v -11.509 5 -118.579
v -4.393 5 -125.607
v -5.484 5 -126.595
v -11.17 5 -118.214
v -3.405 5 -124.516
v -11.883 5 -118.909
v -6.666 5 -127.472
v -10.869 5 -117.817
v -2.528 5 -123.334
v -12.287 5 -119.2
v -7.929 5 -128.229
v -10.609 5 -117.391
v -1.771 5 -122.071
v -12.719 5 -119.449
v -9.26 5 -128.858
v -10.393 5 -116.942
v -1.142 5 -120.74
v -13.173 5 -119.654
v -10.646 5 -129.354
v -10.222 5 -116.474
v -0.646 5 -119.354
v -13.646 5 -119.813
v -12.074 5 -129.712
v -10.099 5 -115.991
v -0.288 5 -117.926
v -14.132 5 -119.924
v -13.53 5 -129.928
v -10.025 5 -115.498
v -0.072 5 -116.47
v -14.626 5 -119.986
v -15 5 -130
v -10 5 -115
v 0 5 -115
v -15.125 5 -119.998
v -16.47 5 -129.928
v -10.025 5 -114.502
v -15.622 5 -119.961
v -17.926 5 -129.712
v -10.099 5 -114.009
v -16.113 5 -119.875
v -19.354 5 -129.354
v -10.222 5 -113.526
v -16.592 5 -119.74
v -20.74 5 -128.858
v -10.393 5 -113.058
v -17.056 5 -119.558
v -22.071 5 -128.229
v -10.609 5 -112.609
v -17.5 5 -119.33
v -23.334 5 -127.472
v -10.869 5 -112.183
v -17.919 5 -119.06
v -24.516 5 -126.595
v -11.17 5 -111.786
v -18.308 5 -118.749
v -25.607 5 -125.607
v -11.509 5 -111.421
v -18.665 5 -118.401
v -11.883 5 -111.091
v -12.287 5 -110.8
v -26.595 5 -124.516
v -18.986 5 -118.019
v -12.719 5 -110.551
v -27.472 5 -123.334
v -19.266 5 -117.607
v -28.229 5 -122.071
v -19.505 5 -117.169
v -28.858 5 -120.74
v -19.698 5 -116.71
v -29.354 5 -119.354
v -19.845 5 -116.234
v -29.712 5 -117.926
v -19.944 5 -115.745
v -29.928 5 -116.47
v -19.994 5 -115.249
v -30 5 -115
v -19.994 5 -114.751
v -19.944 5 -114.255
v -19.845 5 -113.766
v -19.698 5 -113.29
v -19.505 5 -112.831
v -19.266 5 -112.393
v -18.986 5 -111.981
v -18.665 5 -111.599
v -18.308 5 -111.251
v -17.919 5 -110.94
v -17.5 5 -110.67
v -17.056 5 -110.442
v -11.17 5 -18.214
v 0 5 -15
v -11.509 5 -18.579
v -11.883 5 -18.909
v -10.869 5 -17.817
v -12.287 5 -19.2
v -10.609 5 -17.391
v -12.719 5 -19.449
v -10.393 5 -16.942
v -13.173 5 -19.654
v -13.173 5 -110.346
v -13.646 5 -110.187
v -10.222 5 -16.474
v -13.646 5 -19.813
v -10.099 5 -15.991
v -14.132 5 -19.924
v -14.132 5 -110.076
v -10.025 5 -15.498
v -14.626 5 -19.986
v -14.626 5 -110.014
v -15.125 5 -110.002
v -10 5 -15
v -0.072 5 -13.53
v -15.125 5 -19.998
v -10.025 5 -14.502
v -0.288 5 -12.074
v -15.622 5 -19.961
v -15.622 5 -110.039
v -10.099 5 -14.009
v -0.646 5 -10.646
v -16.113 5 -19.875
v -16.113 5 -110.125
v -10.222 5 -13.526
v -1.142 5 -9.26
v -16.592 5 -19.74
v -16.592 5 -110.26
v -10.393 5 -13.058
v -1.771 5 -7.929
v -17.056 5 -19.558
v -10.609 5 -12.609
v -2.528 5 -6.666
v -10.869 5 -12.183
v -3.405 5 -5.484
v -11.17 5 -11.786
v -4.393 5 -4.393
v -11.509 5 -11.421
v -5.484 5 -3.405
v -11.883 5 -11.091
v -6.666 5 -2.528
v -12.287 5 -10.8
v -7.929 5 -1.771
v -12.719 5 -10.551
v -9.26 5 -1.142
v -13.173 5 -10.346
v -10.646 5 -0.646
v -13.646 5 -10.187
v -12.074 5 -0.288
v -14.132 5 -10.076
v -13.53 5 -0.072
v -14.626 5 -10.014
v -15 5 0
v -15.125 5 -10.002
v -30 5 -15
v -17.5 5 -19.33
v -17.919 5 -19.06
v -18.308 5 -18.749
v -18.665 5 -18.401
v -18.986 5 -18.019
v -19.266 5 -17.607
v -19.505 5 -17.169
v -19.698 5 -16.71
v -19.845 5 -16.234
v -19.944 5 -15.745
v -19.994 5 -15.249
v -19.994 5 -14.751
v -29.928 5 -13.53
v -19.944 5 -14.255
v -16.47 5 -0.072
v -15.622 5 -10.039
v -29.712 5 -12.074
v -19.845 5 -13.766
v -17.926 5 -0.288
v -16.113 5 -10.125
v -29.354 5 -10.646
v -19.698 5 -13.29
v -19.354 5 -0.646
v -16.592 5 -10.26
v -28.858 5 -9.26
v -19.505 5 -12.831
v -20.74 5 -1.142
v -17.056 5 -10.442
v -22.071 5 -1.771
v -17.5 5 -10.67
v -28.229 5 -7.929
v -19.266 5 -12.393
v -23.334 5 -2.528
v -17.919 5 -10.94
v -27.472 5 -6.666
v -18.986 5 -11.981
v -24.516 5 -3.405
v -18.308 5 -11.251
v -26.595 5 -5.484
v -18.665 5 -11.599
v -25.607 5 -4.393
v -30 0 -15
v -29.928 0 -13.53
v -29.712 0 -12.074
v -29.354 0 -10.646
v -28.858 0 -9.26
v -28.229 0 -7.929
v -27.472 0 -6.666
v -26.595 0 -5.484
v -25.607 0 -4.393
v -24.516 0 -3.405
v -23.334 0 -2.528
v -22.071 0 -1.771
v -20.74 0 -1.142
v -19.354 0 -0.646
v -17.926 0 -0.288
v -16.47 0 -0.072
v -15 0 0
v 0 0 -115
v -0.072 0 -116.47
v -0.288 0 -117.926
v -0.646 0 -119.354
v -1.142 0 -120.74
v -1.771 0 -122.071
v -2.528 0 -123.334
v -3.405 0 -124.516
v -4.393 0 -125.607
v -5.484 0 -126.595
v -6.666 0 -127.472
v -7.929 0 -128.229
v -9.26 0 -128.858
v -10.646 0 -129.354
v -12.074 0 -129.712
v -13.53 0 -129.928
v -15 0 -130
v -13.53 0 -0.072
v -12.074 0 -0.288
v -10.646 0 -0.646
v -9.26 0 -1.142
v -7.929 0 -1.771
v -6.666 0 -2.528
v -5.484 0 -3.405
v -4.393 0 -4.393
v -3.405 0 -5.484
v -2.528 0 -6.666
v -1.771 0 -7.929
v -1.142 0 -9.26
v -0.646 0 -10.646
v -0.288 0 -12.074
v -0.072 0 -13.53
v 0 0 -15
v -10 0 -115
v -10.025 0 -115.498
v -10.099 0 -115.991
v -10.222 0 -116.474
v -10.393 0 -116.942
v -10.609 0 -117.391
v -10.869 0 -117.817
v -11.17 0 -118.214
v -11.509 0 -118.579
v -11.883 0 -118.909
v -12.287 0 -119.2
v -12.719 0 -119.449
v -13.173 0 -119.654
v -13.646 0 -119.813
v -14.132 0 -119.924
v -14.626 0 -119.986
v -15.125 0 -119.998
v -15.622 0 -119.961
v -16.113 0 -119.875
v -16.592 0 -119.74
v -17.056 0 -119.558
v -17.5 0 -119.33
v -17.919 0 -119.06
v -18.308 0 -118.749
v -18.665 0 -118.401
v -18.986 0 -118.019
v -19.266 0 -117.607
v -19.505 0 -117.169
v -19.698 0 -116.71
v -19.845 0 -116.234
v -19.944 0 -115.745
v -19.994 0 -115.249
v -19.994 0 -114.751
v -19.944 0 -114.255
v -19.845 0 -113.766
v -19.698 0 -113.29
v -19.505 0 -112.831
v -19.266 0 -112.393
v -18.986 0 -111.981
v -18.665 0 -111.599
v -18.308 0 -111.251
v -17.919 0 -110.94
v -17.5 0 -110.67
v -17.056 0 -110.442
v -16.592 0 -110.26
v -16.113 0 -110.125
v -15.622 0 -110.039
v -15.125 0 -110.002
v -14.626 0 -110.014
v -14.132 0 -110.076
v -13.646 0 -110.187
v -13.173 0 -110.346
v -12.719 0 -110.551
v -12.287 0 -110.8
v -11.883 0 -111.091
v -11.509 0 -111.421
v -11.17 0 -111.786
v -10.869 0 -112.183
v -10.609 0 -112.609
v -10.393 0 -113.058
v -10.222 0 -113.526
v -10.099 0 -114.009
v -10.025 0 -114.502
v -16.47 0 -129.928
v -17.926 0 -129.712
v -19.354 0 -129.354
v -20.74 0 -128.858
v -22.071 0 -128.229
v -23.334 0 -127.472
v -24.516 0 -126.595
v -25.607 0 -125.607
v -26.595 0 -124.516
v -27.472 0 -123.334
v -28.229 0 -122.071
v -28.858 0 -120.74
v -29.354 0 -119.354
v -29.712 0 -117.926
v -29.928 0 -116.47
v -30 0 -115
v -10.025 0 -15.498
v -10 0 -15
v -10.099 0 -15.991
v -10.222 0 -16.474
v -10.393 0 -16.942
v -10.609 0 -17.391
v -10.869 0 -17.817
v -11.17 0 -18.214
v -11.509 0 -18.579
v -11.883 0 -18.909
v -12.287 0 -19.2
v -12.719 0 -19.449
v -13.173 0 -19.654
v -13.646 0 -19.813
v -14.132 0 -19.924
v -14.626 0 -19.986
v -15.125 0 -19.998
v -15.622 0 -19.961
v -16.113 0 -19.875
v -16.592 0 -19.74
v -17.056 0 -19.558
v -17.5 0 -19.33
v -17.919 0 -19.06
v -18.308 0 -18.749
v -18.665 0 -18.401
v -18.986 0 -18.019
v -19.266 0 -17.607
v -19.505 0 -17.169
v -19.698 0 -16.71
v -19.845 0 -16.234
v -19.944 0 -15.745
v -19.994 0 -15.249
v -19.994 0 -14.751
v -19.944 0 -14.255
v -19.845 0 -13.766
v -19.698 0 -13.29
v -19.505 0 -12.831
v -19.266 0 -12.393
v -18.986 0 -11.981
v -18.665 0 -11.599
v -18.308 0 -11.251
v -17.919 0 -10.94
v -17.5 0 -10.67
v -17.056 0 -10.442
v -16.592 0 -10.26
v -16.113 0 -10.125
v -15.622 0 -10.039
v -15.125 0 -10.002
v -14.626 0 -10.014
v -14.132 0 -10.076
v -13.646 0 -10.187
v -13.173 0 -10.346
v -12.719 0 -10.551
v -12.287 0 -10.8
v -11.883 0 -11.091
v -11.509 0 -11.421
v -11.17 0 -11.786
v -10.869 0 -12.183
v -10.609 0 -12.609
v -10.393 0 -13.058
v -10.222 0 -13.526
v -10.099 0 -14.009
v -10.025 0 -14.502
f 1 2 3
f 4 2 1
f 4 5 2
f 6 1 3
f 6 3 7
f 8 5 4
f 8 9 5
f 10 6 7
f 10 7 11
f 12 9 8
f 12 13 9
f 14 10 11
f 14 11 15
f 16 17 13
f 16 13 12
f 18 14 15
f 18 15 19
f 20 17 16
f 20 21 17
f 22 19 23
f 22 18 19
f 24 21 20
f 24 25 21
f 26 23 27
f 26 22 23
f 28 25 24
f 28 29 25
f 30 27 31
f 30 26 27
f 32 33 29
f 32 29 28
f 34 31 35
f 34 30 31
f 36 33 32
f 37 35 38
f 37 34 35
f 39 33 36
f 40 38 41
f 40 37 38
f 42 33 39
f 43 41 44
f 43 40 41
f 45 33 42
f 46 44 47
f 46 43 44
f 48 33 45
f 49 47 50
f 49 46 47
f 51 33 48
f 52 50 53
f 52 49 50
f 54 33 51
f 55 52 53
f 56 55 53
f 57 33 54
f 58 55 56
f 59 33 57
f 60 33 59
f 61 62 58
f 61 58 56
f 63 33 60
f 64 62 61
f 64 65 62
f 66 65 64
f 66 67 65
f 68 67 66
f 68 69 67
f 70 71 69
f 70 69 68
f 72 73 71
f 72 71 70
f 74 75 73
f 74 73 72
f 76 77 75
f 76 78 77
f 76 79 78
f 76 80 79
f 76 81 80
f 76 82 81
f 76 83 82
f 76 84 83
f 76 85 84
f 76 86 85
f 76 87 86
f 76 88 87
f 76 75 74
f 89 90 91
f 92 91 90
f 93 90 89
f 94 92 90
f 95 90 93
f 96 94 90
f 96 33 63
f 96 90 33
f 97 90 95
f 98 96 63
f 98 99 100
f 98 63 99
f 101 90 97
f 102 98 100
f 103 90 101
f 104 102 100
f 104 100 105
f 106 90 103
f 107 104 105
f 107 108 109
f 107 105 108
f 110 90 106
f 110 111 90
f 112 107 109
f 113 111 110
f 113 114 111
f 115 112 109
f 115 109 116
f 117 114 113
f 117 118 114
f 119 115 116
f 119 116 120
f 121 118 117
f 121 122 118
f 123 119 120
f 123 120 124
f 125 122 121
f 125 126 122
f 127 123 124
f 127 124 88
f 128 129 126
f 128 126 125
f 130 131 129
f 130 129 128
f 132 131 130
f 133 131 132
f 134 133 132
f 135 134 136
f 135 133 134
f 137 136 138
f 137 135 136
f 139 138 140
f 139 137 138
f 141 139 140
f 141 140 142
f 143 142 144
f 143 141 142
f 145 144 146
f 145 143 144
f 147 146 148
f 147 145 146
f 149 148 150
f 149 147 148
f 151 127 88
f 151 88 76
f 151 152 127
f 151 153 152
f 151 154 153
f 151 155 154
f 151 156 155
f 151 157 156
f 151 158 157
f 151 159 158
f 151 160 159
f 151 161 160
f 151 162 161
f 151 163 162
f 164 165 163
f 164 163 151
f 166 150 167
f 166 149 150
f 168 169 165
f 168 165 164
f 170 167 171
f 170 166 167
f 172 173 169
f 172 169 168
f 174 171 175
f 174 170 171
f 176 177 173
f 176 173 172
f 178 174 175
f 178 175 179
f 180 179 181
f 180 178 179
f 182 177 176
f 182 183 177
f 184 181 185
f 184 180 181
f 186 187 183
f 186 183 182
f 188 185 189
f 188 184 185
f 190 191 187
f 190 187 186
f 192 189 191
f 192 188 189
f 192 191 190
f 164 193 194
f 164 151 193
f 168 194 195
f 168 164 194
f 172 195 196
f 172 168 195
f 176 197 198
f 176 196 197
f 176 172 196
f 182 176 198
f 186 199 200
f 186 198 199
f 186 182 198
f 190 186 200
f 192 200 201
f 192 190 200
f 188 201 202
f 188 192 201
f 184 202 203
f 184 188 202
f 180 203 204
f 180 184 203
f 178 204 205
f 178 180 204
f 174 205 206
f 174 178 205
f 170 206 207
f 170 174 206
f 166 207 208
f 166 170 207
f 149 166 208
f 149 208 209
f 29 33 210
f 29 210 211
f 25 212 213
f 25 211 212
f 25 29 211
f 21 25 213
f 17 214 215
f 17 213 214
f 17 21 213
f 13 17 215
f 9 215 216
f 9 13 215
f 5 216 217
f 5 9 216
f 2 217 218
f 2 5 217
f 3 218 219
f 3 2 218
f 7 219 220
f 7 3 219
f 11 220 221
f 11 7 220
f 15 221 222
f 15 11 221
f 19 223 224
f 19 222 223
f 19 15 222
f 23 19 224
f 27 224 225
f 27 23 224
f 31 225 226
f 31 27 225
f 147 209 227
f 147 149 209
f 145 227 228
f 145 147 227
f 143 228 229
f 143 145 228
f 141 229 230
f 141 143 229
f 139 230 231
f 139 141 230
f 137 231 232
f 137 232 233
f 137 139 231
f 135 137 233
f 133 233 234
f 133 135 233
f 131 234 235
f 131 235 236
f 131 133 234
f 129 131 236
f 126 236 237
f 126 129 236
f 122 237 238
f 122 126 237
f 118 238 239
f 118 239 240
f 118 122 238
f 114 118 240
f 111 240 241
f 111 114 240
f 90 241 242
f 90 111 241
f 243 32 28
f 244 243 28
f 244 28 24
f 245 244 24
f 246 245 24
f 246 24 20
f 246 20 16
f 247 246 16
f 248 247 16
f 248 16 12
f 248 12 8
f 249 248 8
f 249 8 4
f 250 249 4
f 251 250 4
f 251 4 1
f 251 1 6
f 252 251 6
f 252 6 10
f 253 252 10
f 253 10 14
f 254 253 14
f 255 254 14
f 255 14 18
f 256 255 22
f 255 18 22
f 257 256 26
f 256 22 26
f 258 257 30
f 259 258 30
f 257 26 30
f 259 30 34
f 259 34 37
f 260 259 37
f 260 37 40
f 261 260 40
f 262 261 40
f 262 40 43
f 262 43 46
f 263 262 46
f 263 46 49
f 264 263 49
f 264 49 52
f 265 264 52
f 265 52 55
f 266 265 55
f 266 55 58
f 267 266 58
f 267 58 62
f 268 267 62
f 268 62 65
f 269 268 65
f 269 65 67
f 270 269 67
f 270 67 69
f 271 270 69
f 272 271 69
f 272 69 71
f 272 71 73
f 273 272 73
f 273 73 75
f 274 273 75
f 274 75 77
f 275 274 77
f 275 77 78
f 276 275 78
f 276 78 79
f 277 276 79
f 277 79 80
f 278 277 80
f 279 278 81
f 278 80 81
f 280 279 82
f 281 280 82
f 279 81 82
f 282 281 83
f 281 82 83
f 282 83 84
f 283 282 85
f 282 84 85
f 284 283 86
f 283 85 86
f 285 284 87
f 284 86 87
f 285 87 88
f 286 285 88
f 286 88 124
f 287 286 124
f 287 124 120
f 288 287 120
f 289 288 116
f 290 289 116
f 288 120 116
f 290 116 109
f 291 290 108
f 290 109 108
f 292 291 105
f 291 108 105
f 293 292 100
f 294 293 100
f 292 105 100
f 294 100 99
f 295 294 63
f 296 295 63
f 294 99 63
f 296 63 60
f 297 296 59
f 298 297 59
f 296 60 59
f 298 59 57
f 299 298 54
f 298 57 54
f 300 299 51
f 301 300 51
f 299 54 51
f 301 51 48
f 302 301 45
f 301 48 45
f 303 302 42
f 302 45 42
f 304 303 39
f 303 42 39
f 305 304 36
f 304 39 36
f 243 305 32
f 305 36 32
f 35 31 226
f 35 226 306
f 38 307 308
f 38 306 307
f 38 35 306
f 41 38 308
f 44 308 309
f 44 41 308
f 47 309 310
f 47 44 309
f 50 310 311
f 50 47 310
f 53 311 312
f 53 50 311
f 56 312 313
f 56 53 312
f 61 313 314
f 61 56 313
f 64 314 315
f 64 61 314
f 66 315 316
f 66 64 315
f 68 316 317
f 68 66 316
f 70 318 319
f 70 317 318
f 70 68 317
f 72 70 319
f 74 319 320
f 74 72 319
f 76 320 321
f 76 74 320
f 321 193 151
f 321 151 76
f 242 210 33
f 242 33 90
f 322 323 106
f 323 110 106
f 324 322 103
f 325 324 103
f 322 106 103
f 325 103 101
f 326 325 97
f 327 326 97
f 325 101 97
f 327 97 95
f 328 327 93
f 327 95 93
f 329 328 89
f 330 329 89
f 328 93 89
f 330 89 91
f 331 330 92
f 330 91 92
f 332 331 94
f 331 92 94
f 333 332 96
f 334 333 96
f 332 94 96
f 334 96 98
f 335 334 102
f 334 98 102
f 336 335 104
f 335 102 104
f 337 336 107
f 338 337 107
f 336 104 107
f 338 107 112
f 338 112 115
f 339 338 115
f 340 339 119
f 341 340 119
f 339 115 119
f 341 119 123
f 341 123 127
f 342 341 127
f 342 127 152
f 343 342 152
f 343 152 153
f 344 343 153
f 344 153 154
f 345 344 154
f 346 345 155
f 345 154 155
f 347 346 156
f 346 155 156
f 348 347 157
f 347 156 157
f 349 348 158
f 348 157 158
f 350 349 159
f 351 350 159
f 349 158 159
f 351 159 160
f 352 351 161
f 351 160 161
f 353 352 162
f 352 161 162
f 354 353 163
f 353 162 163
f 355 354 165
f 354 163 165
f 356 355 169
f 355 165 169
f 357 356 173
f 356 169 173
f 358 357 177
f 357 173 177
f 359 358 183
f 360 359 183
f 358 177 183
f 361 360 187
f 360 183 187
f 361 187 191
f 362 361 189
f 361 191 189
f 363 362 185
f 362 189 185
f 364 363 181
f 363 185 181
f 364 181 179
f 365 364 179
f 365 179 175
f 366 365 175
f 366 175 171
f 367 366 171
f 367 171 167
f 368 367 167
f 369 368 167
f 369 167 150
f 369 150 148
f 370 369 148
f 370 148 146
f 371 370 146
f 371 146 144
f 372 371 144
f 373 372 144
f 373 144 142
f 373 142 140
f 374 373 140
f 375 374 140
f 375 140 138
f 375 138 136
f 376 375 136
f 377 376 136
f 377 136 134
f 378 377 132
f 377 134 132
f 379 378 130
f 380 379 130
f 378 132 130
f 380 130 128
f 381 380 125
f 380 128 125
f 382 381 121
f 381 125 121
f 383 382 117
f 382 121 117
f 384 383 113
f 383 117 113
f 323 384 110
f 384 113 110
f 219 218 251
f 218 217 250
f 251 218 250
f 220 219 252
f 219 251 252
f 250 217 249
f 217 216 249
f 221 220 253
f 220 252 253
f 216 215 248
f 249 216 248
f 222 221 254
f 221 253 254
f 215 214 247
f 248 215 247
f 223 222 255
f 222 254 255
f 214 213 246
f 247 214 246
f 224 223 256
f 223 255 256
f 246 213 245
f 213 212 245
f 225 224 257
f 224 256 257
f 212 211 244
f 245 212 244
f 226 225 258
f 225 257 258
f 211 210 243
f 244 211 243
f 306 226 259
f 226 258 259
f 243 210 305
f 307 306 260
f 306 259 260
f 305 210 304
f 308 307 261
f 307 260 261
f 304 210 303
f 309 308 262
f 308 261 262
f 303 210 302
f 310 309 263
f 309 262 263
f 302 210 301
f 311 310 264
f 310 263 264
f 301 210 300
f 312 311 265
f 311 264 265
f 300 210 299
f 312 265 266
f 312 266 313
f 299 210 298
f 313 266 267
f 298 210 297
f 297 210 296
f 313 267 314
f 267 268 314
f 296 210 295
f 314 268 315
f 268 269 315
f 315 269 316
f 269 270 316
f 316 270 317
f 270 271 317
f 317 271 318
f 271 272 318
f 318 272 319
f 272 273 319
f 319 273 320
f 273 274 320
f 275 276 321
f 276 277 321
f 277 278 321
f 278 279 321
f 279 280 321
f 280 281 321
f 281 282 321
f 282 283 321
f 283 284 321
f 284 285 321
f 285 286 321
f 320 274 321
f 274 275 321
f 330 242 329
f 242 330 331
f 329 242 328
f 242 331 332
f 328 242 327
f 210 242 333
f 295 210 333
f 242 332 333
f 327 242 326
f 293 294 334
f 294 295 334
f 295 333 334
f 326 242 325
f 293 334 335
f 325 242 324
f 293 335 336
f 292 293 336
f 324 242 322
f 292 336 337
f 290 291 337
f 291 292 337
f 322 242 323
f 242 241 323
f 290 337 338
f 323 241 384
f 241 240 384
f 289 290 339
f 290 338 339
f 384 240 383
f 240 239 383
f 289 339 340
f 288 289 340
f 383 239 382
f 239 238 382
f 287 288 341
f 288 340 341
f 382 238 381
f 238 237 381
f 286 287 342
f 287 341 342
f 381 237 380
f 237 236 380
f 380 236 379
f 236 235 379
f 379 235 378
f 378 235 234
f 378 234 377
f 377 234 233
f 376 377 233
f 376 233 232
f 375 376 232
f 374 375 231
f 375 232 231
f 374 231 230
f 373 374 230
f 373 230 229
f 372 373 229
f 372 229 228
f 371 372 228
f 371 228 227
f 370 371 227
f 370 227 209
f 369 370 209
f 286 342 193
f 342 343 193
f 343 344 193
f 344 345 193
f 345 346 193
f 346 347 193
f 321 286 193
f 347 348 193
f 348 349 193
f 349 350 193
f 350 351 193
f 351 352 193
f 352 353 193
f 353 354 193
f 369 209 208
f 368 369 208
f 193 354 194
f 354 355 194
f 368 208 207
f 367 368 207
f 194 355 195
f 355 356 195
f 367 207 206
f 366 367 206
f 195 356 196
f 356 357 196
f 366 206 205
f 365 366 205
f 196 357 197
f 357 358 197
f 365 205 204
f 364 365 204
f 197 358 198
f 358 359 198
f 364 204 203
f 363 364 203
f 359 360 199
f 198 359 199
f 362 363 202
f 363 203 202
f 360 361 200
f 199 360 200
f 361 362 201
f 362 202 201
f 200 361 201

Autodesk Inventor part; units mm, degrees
ref_plane "YZ Plane" through (0, 0, 0) normal (1, 0, 0) x (0, 1, 0)
ref_plane "XZ Plane" through (0, 0, 0) normal (0, 1, 0) x (-1, 0, 0)
ref_plane "XY Plane" through (0, 0, 0) normal (0, 0, 1) x (1, 0, 0)
sketch "Sketch1" plane through (0, 0, 0) normal (0, 1, 0) x (-1, 0, 0)
  line L0 (0, 0) -> (30, 0)
  line L1 (30, 0) -> (30, -130)
  line L2 (30, -130) -> (0, -130)
  line L3 (0, -130) -> (0, 0)
  dimension "d0" = 30
  dimension "d1" = 130
extrude "Extrusion1" add sketch "Sketch1" along normal blind 5
fillet "Fillet1" radius 15 4 edges at (0, 2.5, 0) (-30, 2.5, 0) (0, 2.5, -130) (-30, 2.5, -130)
sketch "Sketch2" plane through (0, 5, 0) normal (0, 1, 0) x (1, 0, 0)
  arc A0 (-30, 15) -> (0, 15) centre (-15, 15) ccw projected
  circle A1 centre (-15, 15) radius 5
  arc A2 (0, 115) -> (-30, 115) centre (-15, 115) ccw projected
  circle A3 centre (-15, 115) radius 5
  point P0 (0, 0)
  dimension "d5" = 10
  dimension "d6" = 10
extrude "Extrusion2" cut sketch "Sketch2" against normal blind 10
equation "\"d7\" = d6"
properties part number "Rocker"
